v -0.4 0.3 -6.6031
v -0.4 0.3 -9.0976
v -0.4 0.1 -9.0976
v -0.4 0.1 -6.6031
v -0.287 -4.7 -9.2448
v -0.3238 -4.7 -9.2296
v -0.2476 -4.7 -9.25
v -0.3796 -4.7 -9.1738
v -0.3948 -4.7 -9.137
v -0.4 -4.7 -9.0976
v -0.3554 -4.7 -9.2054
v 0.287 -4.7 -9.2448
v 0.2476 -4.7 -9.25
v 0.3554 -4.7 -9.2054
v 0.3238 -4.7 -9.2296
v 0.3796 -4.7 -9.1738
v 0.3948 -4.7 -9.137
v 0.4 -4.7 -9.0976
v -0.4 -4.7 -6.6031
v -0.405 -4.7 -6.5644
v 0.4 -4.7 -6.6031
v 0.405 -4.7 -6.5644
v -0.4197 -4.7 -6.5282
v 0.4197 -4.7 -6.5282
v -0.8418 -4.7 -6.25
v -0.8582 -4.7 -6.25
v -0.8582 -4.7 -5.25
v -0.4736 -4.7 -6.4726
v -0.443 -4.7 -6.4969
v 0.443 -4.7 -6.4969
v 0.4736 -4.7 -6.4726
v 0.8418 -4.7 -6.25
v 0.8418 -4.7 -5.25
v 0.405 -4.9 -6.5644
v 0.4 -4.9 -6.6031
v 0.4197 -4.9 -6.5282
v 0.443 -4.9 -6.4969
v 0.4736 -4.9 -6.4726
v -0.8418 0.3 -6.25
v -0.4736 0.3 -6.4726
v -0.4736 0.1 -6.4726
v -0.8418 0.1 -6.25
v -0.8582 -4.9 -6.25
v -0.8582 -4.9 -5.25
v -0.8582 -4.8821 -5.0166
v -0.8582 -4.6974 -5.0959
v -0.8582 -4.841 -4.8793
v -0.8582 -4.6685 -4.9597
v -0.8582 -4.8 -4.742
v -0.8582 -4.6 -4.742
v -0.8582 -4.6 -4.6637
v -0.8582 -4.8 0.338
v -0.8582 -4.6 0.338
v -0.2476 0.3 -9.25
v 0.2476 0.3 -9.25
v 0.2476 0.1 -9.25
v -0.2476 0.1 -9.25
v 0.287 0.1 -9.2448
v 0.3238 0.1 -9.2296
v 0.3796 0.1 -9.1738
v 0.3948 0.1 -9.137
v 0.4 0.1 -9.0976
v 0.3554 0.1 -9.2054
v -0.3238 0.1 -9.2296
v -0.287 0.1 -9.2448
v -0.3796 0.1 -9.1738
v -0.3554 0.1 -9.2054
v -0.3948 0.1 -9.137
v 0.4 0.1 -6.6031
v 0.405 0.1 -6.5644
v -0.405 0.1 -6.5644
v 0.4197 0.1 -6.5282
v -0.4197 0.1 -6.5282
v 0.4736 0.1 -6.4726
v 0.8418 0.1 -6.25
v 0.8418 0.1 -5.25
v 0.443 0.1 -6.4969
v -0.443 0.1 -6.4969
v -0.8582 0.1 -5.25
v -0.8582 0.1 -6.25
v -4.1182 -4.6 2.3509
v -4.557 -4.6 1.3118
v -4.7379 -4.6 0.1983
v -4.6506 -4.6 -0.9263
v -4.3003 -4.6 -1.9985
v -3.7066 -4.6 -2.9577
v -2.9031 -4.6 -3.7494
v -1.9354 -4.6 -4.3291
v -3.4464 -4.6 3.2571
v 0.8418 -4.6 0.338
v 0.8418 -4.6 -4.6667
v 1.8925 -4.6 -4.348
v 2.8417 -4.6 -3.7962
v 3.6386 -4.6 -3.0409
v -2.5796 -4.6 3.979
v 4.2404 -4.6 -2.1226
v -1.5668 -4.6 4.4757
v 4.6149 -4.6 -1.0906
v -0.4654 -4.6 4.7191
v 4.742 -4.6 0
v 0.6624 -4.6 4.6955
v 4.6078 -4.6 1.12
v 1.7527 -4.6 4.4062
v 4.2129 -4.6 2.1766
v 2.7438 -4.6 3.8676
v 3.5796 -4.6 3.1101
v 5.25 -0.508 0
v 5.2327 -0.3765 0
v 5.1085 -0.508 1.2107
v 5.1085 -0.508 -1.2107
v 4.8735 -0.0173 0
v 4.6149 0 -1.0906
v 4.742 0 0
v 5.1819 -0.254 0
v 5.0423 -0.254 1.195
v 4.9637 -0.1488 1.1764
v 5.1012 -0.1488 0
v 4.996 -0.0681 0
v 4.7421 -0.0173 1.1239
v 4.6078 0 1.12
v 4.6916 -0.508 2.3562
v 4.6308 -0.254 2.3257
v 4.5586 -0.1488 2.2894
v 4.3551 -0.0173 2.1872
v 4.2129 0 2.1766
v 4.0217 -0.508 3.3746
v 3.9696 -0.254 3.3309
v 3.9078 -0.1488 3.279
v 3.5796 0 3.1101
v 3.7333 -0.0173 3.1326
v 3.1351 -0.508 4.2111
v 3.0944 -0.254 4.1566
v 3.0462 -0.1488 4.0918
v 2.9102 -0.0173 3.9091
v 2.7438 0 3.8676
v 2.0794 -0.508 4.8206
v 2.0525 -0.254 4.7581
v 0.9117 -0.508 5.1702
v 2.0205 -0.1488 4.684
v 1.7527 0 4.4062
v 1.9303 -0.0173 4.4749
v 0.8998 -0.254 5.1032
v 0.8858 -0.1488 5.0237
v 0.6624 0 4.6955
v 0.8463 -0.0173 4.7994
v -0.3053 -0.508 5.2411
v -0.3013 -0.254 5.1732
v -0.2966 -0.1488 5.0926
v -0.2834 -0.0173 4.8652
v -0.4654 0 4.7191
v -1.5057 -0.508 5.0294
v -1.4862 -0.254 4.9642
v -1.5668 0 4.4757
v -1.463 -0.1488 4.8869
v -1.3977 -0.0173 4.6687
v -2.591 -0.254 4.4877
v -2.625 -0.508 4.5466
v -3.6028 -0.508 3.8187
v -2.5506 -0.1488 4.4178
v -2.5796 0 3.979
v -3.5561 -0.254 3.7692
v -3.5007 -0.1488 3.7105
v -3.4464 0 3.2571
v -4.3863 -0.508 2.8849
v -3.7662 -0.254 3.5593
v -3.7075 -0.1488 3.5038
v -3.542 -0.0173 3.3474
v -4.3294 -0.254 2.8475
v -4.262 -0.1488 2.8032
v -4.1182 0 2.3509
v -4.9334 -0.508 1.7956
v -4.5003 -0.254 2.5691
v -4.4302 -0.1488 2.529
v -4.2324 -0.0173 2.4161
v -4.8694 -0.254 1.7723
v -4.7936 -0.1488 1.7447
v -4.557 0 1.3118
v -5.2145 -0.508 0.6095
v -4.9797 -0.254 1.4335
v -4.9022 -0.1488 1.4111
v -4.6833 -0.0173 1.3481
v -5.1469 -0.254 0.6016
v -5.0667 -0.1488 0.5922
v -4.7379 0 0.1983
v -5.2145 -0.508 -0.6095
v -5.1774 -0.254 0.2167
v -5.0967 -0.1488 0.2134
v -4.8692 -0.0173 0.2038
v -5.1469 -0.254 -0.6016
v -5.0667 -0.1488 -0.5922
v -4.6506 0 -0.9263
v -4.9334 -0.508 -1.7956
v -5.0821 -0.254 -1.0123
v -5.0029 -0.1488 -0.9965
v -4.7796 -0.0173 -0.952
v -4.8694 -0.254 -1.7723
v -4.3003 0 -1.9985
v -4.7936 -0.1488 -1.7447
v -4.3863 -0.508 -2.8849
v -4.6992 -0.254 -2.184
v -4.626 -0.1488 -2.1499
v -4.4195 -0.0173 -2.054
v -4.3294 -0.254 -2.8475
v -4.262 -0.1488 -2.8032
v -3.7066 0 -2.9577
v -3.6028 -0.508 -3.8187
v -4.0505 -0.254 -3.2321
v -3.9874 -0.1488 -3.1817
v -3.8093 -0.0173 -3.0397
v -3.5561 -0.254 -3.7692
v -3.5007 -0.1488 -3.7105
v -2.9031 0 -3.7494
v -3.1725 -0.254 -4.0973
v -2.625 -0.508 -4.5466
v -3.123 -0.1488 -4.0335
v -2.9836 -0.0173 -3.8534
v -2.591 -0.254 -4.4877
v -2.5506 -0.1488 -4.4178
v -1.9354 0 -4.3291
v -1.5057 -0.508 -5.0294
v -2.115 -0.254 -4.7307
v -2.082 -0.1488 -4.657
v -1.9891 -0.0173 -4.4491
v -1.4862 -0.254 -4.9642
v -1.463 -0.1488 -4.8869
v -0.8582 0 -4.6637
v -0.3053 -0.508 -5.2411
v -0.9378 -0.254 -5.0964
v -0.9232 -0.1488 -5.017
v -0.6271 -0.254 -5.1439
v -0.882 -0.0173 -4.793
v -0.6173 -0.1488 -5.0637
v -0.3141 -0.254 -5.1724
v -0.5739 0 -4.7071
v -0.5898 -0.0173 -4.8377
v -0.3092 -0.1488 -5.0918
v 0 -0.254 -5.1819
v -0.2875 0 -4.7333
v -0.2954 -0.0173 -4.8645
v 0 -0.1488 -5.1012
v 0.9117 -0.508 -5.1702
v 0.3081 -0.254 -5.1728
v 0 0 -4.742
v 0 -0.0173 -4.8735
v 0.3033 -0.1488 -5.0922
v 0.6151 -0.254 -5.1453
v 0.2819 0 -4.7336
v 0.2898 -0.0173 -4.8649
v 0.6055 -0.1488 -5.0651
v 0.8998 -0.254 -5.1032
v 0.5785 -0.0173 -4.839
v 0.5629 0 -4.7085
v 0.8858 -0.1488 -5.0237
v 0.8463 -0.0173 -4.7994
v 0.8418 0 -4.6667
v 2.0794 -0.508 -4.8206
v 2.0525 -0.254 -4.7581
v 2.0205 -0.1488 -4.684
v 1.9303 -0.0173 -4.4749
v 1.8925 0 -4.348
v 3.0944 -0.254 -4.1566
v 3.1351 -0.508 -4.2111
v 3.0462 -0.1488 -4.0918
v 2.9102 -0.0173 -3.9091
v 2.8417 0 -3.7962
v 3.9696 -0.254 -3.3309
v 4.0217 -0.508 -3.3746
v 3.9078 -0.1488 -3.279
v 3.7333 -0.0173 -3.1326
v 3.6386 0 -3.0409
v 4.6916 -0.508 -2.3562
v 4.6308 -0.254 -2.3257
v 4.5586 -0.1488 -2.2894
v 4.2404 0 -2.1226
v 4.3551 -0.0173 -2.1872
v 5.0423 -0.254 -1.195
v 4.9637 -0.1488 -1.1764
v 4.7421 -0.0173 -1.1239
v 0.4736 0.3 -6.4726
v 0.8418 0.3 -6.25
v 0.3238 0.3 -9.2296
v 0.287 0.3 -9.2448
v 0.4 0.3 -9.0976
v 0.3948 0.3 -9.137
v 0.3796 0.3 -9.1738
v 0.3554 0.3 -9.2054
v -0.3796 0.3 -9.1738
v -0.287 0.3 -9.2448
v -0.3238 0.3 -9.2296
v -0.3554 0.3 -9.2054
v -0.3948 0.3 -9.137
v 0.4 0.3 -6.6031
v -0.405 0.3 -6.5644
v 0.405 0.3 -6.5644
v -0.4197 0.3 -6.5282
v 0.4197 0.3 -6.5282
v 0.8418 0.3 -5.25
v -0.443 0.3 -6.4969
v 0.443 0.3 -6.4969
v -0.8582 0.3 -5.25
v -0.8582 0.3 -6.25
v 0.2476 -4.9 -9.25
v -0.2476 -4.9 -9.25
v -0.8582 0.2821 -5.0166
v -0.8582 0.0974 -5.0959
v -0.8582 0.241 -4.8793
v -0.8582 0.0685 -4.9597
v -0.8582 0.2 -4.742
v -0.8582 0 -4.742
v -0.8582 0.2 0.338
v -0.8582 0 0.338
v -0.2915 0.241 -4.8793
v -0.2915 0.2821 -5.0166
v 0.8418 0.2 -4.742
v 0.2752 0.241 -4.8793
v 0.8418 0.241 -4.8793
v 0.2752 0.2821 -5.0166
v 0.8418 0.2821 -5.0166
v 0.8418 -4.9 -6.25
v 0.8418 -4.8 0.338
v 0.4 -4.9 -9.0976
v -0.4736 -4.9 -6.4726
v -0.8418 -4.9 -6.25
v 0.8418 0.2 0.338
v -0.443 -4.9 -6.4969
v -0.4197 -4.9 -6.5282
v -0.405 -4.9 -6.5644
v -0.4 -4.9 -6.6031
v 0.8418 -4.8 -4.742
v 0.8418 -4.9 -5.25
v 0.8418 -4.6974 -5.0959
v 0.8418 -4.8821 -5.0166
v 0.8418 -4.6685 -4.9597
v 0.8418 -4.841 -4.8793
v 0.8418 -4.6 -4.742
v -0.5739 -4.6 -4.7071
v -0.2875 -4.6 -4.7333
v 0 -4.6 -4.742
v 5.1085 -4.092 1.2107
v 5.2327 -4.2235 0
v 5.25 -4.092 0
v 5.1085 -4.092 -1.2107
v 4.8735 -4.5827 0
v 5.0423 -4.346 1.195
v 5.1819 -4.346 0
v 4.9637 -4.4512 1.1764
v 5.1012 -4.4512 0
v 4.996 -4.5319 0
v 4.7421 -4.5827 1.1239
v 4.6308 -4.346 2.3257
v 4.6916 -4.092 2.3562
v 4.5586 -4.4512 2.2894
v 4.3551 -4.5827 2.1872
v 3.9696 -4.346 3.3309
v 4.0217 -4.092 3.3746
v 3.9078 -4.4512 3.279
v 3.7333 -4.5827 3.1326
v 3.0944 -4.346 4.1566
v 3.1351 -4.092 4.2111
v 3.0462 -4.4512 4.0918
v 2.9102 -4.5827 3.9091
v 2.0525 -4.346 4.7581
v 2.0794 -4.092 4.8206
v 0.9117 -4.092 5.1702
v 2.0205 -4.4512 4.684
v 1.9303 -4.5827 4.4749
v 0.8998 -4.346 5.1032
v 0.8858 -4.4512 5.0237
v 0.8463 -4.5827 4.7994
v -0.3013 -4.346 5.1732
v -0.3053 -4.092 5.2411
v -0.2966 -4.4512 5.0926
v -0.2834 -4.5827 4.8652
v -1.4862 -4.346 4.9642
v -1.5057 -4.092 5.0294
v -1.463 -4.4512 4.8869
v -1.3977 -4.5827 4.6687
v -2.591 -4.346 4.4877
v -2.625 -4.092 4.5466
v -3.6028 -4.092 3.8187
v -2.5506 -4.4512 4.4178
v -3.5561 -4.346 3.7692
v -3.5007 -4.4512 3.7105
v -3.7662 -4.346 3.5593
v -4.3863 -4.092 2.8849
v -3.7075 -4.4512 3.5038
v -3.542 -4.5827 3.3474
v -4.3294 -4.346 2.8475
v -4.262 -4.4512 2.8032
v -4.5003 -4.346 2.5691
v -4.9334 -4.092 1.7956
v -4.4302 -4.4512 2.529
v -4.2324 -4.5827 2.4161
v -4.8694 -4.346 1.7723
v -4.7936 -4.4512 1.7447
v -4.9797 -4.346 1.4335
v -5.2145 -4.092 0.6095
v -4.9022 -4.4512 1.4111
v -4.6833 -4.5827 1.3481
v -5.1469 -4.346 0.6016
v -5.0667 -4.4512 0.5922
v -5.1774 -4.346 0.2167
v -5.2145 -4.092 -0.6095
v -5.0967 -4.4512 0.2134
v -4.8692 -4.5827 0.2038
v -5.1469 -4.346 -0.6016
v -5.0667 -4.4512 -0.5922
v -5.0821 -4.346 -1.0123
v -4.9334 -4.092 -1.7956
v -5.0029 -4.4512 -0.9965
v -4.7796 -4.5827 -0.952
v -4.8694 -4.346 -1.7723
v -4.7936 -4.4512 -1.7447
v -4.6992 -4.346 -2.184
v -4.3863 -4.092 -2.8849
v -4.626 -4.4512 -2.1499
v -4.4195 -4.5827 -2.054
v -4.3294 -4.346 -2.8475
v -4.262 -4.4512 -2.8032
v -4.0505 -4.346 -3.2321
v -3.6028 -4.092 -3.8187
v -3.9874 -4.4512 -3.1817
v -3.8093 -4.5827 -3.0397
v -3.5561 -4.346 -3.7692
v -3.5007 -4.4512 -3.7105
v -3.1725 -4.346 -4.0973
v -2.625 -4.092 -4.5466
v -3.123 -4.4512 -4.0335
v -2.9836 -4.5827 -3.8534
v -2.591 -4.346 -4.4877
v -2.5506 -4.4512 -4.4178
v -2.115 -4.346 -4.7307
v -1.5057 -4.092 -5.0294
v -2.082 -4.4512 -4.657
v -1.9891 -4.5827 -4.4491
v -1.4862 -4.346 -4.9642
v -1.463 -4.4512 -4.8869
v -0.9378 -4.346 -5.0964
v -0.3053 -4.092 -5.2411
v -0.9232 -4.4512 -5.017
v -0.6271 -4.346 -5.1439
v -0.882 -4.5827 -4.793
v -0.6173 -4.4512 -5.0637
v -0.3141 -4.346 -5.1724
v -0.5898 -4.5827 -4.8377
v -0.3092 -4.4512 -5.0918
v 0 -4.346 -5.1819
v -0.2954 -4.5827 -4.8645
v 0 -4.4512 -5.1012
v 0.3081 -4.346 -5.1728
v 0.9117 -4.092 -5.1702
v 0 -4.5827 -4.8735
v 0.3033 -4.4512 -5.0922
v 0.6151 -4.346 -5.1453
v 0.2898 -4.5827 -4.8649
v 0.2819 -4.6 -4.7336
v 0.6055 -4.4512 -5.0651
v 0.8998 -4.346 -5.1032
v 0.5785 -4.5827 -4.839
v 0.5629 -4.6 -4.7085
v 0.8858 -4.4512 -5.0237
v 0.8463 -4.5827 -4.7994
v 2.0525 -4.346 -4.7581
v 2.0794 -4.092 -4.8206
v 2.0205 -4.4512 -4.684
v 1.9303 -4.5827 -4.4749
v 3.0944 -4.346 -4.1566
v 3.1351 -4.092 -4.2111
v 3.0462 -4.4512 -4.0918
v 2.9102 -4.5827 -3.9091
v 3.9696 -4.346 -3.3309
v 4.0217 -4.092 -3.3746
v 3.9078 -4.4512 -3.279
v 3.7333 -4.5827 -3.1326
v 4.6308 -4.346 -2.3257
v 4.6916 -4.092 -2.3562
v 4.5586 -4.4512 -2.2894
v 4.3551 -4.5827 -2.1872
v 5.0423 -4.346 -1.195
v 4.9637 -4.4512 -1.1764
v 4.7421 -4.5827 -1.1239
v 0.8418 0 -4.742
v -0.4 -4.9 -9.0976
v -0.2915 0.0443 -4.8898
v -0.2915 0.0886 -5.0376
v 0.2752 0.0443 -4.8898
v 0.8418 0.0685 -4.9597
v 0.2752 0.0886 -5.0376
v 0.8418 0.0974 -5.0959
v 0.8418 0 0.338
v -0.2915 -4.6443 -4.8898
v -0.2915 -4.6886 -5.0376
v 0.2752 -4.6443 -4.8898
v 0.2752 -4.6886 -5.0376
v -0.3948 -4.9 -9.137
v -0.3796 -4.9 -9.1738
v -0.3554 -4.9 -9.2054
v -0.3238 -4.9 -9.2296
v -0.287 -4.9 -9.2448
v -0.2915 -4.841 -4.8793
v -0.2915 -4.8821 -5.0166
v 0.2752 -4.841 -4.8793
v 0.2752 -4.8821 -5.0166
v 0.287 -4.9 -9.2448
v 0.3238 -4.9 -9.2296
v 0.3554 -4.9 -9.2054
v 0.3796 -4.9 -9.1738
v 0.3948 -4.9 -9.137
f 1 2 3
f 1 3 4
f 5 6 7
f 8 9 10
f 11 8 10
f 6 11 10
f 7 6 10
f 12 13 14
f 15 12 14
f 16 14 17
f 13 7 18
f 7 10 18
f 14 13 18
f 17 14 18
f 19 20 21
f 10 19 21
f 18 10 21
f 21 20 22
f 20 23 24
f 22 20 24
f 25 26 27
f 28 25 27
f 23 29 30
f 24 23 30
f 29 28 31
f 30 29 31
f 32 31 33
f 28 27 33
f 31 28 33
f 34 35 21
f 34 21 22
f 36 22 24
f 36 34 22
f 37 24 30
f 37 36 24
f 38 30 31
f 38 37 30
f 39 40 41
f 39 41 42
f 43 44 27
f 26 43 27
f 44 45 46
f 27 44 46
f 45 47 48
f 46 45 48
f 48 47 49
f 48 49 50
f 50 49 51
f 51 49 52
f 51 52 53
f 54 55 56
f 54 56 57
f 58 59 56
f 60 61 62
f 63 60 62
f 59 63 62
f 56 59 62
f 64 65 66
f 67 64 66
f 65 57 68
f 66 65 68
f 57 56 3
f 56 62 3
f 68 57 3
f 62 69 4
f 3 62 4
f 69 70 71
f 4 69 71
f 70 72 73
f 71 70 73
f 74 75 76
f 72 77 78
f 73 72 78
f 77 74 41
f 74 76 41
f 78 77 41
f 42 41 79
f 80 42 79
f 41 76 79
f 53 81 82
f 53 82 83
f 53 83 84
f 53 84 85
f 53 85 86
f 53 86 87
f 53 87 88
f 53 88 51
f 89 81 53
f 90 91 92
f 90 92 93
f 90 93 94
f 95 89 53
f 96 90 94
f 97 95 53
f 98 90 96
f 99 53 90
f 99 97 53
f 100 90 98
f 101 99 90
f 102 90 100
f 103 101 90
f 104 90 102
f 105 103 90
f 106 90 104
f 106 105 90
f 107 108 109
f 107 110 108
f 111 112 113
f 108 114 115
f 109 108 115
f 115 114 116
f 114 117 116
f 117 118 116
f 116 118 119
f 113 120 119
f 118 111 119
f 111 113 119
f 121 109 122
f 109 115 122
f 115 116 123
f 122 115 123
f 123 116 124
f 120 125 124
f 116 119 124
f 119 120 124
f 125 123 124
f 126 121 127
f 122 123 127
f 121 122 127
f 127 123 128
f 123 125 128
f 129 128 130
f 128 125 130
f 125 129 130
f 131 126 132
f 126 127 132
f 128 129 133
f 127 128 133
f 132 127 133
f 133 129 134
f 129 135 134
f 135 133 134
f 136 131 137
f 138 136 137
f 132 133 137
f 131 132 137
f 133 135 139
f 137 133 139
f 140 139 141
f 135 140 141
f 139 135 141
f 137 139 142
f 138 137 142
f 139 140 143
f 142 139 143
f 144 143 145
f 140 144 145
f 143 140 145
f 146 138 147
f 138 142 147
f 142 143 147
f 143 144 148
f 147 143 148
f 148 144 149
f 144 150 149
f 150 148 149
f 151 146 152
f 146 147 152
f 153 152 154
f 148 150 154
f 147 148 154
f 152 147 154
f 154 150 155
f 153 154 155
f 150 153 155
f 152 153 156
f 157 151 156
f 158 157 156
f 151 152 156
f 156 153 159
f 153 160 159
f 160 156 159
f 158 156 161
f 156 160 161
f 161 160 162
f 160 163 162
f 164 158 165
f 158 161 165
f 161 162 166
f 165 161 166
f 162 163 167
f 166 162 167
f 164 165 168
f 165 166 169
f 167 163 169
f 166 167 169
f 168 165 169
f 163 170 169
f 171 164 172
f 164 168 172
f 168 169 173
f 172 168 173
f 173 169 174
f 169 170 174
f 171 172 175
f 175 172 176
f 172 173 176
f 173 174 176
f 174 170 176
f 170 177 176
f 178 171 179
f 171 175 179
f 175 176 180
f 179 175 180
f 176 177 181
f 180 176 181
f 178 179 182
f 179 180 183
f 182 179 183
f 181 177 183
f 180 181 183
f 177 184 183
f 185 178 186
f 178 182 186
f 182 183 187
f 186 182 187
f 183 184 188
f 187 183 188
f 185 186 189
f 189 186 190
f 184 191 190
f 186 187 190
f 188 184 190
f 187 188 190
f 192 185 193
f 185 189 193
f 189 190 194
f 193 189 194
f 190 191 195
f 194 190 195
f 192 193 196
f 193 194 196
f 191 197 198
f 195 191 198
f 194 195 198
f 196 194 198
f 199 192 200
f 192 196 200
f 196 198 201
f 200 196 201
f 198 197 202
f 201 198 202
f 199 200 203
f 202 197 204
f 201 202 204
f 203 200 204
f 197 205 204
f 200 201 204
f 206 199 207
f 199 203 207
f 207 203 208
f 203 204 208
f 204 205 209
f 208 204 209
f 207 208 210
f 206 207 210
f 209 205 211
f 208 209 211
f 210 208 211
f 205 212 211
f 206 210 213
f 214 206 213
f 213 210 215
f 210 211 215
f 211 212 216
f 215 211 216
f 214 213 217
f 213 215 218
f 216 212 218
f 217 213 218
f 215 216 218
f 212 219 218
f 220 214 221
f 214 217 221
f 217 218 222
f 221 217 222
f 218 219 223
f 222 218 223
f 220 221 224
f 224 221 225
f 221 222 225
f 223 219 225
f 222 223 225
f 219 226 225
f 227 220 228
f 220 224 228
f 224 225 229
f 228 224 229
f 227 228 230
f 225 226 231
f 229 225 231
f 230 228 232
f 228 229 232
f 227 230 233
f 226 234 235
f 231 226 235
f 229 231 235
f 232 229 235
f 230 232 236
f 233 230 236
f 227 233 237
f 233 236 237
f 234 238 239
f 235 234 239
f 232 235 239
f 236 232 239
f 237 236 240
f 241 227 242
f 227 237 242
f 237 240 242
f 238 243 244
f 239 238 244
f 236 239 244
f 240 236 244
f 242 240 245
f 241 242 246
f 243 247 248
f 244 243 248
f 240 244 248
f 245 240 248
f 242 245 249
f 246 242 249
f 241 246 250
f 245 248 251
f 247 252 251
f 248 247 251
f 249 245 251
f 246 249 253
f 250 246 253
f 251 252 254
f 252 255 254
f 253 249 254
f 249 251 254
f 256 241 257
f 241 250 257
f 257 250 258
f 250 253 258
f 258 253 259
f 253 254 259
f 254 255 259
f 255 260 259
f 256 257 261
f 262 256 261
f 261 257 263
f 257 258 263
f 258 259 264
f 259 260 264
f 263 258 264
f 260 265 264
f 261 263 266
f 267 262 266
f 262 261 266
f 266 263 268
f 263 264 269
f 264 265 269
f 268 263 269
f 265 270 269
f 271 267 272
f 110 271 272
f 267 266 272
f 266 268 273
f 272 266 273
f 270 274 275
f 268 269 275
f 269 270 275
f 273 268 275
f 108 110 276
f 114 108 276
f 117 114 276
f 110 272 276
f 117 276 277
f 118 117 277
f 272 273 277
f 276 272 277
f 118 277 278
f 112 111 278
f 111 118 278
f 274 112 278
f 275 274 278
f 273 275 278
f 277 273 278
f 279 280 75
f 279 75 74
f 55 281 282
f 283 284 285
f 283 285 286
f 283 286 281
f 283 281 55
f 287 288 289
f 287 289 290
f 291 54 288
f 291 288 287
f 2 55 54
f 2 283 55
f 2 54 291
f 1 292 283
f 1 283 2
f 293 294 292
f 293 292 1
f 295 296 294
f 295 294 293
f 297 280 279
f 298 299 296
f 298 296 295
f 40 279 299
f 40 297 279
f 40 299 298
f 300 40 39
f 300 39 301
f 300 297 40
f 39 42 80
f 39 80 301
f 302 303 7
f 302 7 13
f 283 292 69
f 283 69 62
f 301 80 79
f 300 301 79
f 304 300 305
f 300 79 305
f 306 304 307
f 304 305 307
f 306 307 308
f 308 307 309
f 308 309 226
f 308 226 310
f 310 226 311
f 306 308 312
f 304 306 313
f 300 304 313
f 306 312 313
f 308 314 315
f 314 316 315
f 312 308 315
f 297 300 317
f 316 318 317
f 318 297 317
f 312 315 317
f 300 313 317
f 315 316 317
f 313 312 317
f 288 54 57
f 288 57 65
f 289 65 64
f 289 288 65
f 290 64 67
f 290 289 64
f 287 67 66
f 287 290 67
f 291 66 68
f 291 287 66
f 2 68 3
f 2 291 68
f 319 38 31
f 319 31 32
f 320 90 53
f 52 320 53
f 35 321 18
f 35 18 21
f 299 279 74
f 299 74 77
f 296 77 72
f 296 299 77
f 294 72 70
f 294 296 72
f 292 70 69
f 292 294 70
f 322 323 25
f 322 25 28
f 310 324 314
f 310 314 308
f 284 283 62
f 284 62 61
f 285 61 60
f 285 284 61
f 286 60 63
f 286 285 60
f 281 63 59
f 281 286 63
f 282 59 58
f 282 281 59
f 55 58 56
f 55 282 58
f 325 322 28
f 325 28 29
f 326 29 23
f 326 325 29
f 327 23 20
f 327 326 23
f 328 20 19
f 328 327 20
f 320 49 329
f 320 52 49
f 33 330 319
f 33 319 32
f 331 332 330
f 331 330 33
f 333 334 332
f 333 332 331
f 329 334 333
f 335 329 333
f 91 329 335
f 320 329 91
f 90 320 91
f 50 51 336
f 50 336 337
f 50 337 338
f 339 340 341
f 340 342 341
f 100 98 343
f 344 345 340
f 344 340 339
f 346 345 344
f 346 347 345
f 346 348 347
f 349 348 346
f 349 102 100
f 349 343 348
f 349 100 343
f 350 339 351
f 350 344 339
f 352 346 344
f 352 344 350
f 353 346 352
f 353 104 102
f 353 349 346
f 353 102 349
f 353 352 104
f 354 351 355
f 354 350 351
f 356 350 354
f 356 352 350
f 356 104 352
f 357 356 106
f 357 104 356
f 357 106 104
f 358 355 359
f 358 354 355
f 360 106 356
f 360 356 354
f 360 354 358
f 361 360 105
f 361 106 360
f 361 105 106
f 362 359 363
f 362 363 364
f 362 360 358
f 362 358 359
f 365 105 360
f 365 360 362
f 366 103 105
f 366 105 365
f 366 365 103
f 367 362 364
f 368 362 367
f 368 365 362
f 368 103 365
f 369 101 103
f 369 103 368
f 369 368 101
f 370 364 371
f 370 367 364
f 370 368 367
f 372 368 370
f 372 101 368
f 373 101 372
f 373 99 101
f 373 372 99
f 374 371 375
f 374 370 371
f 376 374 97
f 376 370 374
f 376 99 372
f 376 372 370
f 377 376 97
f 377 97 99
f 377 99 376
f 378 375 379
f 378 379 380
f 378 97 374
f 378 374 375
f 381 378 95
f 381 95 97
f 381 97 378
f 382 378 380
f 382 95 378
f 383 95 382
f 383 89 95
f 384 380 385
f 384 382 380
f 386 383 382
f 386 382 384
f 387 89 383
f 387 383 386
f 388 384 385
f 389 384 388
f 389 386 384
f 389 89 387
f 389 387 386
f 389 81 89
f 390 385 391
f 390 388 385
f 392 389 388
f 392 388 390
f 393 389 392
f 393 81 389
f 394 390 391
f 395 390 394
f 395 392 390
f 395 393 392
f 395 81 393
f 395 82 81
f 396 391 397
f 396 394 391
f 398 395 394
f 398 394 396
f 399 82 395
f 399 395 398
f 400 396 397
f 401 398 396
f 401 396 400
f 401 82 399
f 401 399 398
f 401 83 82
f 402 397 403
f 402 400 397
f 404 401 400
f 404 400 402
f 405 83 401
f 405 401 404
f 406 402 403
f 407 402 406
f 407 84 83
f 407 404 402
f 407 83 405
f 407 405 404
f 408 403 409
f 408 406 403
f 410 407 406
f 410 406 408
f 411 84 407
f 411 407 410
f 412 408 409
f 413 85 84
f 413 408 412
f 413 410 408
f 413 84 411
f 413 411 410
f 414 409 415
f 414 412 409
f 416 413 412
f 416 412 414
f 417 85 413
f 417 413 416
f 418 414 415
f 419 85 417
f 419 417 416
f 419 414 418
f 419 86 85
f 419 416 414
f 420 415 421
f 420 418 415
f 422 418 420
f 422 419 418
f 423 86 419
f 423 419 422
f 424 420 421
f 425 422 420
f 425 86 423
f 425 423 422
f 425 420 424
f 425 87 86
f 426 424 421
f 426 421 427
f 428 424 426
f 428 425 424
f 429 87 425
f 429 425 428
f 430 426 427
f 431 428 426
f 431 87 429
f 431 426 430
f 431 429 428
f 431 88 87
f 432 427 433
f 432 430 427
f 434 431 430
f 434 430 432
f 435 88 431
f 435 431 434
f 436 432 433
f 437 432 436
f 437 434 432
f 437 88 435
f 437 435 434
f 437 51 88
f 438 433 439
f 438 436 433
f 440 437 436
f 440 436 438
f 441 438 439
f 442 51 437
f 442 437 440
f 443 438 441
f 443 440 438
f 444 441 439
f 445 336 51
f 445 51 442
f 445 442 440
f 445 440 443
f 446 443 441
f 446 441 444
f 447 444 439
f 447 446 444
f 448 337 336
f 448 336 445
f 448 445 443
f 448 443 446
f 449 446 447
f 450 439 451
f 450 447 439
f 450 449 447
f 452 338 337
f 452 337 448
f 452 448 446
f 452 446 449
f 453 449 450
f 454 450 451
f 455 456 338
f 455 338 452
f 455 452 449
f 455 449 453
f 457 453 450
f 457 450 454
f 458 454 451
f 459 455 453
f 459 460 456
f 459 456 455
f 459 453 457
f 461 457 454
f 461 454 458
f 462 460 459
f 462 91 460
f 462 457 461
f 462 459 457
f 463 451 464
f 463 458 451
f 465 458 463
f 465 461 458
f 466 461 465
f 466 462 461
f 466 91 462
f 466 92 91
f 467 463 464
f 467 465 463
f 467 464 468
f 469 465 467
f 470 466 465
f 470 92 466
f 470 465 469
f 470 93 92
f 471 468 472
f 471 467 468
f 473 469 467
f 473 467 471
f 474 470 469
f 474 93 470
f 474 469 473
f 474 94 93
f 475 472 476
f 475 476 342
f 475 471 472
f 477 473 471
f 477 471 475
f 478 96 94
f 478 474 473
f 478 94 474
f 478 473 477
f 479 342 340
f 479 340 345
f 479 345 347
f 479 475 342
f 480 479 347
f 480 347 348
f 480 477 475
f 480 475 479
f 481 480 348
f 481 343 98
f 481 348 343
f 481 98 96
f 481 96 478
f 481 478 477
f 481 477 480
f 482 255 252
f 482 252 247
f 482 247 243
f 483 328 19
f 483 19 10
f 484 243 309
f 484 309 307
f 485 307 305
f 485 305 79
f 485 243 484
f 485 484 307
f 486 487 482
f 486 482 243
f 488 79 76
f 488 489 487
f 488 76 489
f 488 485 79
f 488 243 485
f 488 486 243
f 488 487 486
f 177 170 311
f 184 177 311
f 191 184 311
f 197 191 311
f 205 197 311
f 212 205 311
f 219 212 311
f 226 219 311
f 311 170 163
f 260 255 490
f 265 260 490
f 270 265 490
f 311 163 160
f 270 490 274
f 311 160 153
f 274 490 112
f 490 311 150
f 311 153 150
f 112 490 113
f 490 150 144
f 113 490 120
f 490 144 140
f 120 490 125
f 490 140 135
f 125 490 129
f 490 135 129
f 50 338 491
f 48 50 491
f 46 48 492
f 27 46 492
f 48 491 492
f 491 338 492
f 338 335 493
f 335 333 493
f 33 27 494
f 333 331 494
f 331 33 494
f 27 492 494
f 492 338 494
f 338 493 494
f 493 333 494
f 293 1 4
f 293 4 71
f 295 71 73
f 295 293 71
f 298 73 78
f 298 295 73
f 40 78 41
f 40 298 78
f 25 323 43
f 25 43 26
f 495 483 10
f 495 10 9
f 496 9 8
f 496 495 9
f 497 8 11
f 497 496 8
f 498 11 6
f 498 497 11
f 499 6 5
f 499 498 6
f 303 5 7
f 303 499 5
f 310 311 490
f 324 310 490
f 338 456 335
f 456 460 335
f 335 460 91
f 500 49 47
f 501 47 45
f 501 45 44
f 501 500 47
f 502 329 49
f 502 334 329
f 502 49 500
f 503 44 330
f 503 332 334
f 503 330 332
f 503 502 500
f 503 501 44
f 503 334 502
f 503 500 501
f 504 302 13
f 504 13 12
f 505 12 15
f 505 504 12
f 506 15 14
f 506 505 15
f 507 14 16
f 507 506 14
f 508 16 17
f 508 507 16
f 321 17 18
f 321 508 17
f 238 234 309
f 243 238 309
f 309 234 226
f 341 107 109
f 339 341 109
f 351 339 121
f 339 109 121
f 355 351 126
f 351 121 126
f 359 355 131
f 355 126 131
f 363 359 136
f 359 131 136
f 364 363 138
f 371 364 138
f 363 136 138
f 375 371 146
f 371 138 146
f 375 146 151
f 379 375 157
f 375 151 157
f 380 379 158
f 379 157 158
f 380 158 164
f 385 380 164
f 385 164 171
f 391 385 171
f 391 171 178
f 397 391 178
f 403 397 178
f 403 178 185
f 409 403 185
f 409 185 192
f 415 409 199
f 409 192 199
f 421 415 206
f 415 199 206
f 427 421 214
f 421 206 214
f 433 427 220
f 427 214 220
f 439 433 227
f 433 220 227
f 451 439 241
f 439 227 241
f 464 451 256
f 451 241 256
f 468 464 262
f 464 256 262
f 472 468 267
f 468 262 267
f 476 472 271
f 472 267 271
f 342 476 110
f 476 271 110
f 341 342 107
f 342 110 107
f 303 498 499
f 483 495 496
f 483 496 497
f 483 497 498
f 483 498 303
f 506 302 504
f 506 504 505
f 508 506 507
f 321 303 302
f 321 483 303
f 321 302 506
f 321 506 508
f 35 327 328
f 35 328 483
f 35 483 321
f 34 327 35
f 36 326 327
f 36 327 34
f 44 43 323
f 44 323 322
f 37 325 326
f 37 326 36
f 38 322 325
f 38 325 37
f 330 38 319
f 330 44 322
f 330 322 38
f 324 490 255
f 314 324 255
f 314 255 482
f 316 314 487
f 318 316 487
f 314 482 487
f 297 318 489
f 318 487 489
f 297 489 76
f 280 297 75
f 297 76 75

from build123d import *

# Parameters (mm, degrees)
F0_R      = 5.25
F1_DEPTH  = 4.6
F2_R      = 0.508
F4_DEPTH  = 0.2
F6_DEPTH  = 0.2
F7_W      = 0.2
F7_H      = 1
F8_DEPTH  = 1.7
F10_DEPTH = 0.2
F12_DEPTH = 0.2


with BuildPart() as f1:
    # F0 (on Front) → F1 (new body)
    with BuildSketch(Plane.XZ):
        Circle(F0_R)
    extrude(amount=F1_DEPTH)

    # F2
    f2_edges = [f1.edges().sort_by_distance(p)[0] for p in [
        (-5.25, -4.6, 0),
        (-5.25, 0, 0),
    ]]
    fillet(f2_edges, radius=F2_R)

    # F3 (on face) → F4 (join)
    with BuildSketch(Plane(origin=(0, 0, 0), x_dir=(-1, 0, 0), z_dir=(0, 1, 0))):
        with BuildLine():
            Line((0.8581771286, 0.338), (-0.8418228714, 0.338))
            Line((-0.8418228714, 0.338), (-0.8418228714, -4.6666795747))
            ThreePointArc((-0.8418228714, -4.6666795747), (-0.4225928635, -4.7231323581), (0, -4.742))
            ThreePointArc((0, -4.742), (0.430870892, -4.7223843844), (0.8581771286, -4.6636998205))
            Line((0.8581771286, -4.6636998205), (0.8581771286, 0.338))
        make_face()
        with BuildLine():
            ThreePointArc((0, -4.742), (-0.4225928635, -4.7231323581), (-0.8418228714, -4.6666795747))
            Line((-0.8418228714, -4.6666795747), (-0.8418228714, -4.742))
            Line((-0.8418228714, -4.742), (0, -4.742))
        make_face()
        with BuildLine():
            Line((0.8581771286, -4.742), (0.8581771286, -4.6636998205))
            ThreePointArc((0.8581771286, -4.6636998205), (0.430870892, -4.7223843844), (0, -4.742))
            Line((0, -4.742), (0.8581771286, -4.742))
        make_face()
    extrude(amount=F4_DEPTH)

    # F5 (on face) → F6 (join)
    with BuildSketch(Plane.XZ.offset(4.6)):
        with BuildLine():
            Line((-0.8581771286, -4.742), (0, -4.742))
            ThreePointArc((0, -4.742), (-0.430870892, -4.7223843844), (-0.8581771286, -4.6636998205))
            Line((-0.8581771286, -4.6636998205), (-0.8581771286, -4.742))
        make_face()
        with BuildLine():
            Line((0.8418228714, -4.6666795747), (0.8418228714, 0.338))
            Line((0.8418228714, 0.338), (-0.8581771286, 0.338))
            Line((-0.8581771286, 0.338), (-0.8581771286, -4.6636998205))
            ThreePointArc((-0.8581771286, -4.6636998205), (-0.430870892, -4.7223843844), (0, -4.742))
            ThreePointArc((0, -4.742), (0.4225928635, -4.7231323581), (0.8418228714, -4.6666795747))
        make_face()
        with BuildLine():
            Line((0.8418228714, -4.742), (0.8418228714, -4.6666795747))
            ThreePointArc((0.8418228714, -4.6666795747), (0.4225928635, -4.7231323581), (0, -4.742))
            Line((0, -4.742), (0.8418228714, -4.742))
        make_face()
    extrude(amount=F6_DEPTH)

    # F7 (on face) → F8 (join, through all)
    with BuildSketch(Plane.YZ.offset(0.8418228714)):
        with Locations((-4.8, -5.75)):
            Rectangle(F7_W, F7_H)
        with BuildLine():
            add(Edge.make_bspline(
                [(-4.8, -4.742), (-4.8333333333, -4.9113333333), (-4.901335109, -4.936598707), (-4.9, -5.25)],
                knots=[0, 0, 0, 0, 0.5177489739, 0.5177489739, 0.5177489739, 0.5177489739], degree=3))
            Line((-4.9, -5.25), (-4.7, -5.25))
            add(Edge.make_bspline(
                [(-4.6, -4.742), (-4.6333333333, -4.9113333333), (-4.7159921378, -4.9838428386), (-4.7, -5.25)],
                knots=[0, 0, 0, 0, 0.5177489739, 0.5177489739, 0.5177489739, 0.5177489739], degree=3))
            Line((-4.6, -4.742), (-4.8, -4.742))
        make_face()
        with Locations((0.2, -5.75)):
            Rectangle(F7_W, F7_H)
        with BuildLine():
            add(Edge.make_bspline(
                [(0, -4.742), (0.0333333333, -4.9113333333), (0.1159921378, -4.9838428386), (0.1, -5.25)],
                knots=[0, 0, 0, 0, 0.5177489739, 0.5177489739, 0.5177489739, 0.5177489739], degree=3))
            Line((0.1, -5.25), (0.3, -5.25))
            add(Edge.make_bspline(
                [(0.2, -4.742), (0.2333333333, -4.9113333333), (0.301335109, -4.936598707), (0.3, -5.25)],
                knots=[0, 0, 0, 0, 0.5177489739, 0.5177489739, 0.5177489739, 0.5177489739], degree=3))
            Line((0.2, -4.742), (0, -4.742))
        make_face()
    extrude(amount=-F8_DEPTH)

    # F9 (on face) → F10 (join, through all)
    with BuildSketch(Plane(origin=(0, 0.3, 0), x_dir=(-1, 0, 0), z_dir=(0, 1, 0))):
        with BuildLine():
            Line((0.4, -6.25), (-0.4, -6.25))
            Line((-0.4, -6.25), (-0.8418228714, -6.25))
            Line((-0.8418228714, -6.25), (-0.4735729361, -6.4726176162))
            ThreePointArc((-0.4735729361, -6.4726176162), (-0.4196612114, -6.5281834474), (-0.4, -6.6030665057))
            Line((-0.4, -6.6030665057), (-0.4, -9.0975669799))
            ThreePointArc((-0.4, -9.0975669799), (-0.3553534021, -9.2053534021), (-0.2475669799, -9.25))
            Line((-0.2475669799, -9.25), (0.2475669799, -9.25))
            ThreePointArc((0.2475669799, -9.25), (0.3553534021, -9.2053534021), (0.4, -9.0975669799))
            Line((0.4, -9.0975669799), (0.4, -6.6030665057))
            ThreePointArc((0.4, -6.6030665057), (0.4196612114, -6.5281834474), (0.4735729361, -6.4726176162))
            Line((0.4735729361, -6.4726176162), (0.8418228714, -6.25))
            Line((0.8418228714, -6.25), (0.4, -6.25))
        make_face()
    extrude(amount=-F10_DEPTH)

    # F11 (on face) → F12 (join, through all)
    with BuildSketch(Plane.XZ.offset(4.9)):
        with BuildLine():
            ThreePointArc((-0.4735729361, -6.4726176162), (-0.4196612114, -6.5281834474), (-0.4, -6.6030665057))
            Line((-0.4, -6.6030665057), (-0.4, -9.0975669799))
            ThreePointArc((-0.4, -9.0975669799), (-0.3553534021, -9.2053534021), (-0.2475669799, -9.25))
            Line((-0.2475669799, -9.25), (0.2475669799, -9.25))
            ThreePointArc((0.2475669799, -9.25), (0.3553534021, -9.2053534021), (0.4, -9.0975669799))
            Line((0.4, -9.0975669799), (0.4, -6.6030665057))
            ThreePointArc((0.4, -6.6030665057), (0.4196612114, -6.5281834474), (0.4735729361, -6.4726176162))
            Line((0.4735729361, -6.4726176162), (0.8418228714, -6.25))
            Line((0.8418228714, -6.25), (-0.8418228714, -6.25))
            Line((-0.8418228714, -6.25), (-0.4735729361, -6.4726176162))
        make_face()
    extrude(amount=-F12_DEPTH)


solid = f1.part
